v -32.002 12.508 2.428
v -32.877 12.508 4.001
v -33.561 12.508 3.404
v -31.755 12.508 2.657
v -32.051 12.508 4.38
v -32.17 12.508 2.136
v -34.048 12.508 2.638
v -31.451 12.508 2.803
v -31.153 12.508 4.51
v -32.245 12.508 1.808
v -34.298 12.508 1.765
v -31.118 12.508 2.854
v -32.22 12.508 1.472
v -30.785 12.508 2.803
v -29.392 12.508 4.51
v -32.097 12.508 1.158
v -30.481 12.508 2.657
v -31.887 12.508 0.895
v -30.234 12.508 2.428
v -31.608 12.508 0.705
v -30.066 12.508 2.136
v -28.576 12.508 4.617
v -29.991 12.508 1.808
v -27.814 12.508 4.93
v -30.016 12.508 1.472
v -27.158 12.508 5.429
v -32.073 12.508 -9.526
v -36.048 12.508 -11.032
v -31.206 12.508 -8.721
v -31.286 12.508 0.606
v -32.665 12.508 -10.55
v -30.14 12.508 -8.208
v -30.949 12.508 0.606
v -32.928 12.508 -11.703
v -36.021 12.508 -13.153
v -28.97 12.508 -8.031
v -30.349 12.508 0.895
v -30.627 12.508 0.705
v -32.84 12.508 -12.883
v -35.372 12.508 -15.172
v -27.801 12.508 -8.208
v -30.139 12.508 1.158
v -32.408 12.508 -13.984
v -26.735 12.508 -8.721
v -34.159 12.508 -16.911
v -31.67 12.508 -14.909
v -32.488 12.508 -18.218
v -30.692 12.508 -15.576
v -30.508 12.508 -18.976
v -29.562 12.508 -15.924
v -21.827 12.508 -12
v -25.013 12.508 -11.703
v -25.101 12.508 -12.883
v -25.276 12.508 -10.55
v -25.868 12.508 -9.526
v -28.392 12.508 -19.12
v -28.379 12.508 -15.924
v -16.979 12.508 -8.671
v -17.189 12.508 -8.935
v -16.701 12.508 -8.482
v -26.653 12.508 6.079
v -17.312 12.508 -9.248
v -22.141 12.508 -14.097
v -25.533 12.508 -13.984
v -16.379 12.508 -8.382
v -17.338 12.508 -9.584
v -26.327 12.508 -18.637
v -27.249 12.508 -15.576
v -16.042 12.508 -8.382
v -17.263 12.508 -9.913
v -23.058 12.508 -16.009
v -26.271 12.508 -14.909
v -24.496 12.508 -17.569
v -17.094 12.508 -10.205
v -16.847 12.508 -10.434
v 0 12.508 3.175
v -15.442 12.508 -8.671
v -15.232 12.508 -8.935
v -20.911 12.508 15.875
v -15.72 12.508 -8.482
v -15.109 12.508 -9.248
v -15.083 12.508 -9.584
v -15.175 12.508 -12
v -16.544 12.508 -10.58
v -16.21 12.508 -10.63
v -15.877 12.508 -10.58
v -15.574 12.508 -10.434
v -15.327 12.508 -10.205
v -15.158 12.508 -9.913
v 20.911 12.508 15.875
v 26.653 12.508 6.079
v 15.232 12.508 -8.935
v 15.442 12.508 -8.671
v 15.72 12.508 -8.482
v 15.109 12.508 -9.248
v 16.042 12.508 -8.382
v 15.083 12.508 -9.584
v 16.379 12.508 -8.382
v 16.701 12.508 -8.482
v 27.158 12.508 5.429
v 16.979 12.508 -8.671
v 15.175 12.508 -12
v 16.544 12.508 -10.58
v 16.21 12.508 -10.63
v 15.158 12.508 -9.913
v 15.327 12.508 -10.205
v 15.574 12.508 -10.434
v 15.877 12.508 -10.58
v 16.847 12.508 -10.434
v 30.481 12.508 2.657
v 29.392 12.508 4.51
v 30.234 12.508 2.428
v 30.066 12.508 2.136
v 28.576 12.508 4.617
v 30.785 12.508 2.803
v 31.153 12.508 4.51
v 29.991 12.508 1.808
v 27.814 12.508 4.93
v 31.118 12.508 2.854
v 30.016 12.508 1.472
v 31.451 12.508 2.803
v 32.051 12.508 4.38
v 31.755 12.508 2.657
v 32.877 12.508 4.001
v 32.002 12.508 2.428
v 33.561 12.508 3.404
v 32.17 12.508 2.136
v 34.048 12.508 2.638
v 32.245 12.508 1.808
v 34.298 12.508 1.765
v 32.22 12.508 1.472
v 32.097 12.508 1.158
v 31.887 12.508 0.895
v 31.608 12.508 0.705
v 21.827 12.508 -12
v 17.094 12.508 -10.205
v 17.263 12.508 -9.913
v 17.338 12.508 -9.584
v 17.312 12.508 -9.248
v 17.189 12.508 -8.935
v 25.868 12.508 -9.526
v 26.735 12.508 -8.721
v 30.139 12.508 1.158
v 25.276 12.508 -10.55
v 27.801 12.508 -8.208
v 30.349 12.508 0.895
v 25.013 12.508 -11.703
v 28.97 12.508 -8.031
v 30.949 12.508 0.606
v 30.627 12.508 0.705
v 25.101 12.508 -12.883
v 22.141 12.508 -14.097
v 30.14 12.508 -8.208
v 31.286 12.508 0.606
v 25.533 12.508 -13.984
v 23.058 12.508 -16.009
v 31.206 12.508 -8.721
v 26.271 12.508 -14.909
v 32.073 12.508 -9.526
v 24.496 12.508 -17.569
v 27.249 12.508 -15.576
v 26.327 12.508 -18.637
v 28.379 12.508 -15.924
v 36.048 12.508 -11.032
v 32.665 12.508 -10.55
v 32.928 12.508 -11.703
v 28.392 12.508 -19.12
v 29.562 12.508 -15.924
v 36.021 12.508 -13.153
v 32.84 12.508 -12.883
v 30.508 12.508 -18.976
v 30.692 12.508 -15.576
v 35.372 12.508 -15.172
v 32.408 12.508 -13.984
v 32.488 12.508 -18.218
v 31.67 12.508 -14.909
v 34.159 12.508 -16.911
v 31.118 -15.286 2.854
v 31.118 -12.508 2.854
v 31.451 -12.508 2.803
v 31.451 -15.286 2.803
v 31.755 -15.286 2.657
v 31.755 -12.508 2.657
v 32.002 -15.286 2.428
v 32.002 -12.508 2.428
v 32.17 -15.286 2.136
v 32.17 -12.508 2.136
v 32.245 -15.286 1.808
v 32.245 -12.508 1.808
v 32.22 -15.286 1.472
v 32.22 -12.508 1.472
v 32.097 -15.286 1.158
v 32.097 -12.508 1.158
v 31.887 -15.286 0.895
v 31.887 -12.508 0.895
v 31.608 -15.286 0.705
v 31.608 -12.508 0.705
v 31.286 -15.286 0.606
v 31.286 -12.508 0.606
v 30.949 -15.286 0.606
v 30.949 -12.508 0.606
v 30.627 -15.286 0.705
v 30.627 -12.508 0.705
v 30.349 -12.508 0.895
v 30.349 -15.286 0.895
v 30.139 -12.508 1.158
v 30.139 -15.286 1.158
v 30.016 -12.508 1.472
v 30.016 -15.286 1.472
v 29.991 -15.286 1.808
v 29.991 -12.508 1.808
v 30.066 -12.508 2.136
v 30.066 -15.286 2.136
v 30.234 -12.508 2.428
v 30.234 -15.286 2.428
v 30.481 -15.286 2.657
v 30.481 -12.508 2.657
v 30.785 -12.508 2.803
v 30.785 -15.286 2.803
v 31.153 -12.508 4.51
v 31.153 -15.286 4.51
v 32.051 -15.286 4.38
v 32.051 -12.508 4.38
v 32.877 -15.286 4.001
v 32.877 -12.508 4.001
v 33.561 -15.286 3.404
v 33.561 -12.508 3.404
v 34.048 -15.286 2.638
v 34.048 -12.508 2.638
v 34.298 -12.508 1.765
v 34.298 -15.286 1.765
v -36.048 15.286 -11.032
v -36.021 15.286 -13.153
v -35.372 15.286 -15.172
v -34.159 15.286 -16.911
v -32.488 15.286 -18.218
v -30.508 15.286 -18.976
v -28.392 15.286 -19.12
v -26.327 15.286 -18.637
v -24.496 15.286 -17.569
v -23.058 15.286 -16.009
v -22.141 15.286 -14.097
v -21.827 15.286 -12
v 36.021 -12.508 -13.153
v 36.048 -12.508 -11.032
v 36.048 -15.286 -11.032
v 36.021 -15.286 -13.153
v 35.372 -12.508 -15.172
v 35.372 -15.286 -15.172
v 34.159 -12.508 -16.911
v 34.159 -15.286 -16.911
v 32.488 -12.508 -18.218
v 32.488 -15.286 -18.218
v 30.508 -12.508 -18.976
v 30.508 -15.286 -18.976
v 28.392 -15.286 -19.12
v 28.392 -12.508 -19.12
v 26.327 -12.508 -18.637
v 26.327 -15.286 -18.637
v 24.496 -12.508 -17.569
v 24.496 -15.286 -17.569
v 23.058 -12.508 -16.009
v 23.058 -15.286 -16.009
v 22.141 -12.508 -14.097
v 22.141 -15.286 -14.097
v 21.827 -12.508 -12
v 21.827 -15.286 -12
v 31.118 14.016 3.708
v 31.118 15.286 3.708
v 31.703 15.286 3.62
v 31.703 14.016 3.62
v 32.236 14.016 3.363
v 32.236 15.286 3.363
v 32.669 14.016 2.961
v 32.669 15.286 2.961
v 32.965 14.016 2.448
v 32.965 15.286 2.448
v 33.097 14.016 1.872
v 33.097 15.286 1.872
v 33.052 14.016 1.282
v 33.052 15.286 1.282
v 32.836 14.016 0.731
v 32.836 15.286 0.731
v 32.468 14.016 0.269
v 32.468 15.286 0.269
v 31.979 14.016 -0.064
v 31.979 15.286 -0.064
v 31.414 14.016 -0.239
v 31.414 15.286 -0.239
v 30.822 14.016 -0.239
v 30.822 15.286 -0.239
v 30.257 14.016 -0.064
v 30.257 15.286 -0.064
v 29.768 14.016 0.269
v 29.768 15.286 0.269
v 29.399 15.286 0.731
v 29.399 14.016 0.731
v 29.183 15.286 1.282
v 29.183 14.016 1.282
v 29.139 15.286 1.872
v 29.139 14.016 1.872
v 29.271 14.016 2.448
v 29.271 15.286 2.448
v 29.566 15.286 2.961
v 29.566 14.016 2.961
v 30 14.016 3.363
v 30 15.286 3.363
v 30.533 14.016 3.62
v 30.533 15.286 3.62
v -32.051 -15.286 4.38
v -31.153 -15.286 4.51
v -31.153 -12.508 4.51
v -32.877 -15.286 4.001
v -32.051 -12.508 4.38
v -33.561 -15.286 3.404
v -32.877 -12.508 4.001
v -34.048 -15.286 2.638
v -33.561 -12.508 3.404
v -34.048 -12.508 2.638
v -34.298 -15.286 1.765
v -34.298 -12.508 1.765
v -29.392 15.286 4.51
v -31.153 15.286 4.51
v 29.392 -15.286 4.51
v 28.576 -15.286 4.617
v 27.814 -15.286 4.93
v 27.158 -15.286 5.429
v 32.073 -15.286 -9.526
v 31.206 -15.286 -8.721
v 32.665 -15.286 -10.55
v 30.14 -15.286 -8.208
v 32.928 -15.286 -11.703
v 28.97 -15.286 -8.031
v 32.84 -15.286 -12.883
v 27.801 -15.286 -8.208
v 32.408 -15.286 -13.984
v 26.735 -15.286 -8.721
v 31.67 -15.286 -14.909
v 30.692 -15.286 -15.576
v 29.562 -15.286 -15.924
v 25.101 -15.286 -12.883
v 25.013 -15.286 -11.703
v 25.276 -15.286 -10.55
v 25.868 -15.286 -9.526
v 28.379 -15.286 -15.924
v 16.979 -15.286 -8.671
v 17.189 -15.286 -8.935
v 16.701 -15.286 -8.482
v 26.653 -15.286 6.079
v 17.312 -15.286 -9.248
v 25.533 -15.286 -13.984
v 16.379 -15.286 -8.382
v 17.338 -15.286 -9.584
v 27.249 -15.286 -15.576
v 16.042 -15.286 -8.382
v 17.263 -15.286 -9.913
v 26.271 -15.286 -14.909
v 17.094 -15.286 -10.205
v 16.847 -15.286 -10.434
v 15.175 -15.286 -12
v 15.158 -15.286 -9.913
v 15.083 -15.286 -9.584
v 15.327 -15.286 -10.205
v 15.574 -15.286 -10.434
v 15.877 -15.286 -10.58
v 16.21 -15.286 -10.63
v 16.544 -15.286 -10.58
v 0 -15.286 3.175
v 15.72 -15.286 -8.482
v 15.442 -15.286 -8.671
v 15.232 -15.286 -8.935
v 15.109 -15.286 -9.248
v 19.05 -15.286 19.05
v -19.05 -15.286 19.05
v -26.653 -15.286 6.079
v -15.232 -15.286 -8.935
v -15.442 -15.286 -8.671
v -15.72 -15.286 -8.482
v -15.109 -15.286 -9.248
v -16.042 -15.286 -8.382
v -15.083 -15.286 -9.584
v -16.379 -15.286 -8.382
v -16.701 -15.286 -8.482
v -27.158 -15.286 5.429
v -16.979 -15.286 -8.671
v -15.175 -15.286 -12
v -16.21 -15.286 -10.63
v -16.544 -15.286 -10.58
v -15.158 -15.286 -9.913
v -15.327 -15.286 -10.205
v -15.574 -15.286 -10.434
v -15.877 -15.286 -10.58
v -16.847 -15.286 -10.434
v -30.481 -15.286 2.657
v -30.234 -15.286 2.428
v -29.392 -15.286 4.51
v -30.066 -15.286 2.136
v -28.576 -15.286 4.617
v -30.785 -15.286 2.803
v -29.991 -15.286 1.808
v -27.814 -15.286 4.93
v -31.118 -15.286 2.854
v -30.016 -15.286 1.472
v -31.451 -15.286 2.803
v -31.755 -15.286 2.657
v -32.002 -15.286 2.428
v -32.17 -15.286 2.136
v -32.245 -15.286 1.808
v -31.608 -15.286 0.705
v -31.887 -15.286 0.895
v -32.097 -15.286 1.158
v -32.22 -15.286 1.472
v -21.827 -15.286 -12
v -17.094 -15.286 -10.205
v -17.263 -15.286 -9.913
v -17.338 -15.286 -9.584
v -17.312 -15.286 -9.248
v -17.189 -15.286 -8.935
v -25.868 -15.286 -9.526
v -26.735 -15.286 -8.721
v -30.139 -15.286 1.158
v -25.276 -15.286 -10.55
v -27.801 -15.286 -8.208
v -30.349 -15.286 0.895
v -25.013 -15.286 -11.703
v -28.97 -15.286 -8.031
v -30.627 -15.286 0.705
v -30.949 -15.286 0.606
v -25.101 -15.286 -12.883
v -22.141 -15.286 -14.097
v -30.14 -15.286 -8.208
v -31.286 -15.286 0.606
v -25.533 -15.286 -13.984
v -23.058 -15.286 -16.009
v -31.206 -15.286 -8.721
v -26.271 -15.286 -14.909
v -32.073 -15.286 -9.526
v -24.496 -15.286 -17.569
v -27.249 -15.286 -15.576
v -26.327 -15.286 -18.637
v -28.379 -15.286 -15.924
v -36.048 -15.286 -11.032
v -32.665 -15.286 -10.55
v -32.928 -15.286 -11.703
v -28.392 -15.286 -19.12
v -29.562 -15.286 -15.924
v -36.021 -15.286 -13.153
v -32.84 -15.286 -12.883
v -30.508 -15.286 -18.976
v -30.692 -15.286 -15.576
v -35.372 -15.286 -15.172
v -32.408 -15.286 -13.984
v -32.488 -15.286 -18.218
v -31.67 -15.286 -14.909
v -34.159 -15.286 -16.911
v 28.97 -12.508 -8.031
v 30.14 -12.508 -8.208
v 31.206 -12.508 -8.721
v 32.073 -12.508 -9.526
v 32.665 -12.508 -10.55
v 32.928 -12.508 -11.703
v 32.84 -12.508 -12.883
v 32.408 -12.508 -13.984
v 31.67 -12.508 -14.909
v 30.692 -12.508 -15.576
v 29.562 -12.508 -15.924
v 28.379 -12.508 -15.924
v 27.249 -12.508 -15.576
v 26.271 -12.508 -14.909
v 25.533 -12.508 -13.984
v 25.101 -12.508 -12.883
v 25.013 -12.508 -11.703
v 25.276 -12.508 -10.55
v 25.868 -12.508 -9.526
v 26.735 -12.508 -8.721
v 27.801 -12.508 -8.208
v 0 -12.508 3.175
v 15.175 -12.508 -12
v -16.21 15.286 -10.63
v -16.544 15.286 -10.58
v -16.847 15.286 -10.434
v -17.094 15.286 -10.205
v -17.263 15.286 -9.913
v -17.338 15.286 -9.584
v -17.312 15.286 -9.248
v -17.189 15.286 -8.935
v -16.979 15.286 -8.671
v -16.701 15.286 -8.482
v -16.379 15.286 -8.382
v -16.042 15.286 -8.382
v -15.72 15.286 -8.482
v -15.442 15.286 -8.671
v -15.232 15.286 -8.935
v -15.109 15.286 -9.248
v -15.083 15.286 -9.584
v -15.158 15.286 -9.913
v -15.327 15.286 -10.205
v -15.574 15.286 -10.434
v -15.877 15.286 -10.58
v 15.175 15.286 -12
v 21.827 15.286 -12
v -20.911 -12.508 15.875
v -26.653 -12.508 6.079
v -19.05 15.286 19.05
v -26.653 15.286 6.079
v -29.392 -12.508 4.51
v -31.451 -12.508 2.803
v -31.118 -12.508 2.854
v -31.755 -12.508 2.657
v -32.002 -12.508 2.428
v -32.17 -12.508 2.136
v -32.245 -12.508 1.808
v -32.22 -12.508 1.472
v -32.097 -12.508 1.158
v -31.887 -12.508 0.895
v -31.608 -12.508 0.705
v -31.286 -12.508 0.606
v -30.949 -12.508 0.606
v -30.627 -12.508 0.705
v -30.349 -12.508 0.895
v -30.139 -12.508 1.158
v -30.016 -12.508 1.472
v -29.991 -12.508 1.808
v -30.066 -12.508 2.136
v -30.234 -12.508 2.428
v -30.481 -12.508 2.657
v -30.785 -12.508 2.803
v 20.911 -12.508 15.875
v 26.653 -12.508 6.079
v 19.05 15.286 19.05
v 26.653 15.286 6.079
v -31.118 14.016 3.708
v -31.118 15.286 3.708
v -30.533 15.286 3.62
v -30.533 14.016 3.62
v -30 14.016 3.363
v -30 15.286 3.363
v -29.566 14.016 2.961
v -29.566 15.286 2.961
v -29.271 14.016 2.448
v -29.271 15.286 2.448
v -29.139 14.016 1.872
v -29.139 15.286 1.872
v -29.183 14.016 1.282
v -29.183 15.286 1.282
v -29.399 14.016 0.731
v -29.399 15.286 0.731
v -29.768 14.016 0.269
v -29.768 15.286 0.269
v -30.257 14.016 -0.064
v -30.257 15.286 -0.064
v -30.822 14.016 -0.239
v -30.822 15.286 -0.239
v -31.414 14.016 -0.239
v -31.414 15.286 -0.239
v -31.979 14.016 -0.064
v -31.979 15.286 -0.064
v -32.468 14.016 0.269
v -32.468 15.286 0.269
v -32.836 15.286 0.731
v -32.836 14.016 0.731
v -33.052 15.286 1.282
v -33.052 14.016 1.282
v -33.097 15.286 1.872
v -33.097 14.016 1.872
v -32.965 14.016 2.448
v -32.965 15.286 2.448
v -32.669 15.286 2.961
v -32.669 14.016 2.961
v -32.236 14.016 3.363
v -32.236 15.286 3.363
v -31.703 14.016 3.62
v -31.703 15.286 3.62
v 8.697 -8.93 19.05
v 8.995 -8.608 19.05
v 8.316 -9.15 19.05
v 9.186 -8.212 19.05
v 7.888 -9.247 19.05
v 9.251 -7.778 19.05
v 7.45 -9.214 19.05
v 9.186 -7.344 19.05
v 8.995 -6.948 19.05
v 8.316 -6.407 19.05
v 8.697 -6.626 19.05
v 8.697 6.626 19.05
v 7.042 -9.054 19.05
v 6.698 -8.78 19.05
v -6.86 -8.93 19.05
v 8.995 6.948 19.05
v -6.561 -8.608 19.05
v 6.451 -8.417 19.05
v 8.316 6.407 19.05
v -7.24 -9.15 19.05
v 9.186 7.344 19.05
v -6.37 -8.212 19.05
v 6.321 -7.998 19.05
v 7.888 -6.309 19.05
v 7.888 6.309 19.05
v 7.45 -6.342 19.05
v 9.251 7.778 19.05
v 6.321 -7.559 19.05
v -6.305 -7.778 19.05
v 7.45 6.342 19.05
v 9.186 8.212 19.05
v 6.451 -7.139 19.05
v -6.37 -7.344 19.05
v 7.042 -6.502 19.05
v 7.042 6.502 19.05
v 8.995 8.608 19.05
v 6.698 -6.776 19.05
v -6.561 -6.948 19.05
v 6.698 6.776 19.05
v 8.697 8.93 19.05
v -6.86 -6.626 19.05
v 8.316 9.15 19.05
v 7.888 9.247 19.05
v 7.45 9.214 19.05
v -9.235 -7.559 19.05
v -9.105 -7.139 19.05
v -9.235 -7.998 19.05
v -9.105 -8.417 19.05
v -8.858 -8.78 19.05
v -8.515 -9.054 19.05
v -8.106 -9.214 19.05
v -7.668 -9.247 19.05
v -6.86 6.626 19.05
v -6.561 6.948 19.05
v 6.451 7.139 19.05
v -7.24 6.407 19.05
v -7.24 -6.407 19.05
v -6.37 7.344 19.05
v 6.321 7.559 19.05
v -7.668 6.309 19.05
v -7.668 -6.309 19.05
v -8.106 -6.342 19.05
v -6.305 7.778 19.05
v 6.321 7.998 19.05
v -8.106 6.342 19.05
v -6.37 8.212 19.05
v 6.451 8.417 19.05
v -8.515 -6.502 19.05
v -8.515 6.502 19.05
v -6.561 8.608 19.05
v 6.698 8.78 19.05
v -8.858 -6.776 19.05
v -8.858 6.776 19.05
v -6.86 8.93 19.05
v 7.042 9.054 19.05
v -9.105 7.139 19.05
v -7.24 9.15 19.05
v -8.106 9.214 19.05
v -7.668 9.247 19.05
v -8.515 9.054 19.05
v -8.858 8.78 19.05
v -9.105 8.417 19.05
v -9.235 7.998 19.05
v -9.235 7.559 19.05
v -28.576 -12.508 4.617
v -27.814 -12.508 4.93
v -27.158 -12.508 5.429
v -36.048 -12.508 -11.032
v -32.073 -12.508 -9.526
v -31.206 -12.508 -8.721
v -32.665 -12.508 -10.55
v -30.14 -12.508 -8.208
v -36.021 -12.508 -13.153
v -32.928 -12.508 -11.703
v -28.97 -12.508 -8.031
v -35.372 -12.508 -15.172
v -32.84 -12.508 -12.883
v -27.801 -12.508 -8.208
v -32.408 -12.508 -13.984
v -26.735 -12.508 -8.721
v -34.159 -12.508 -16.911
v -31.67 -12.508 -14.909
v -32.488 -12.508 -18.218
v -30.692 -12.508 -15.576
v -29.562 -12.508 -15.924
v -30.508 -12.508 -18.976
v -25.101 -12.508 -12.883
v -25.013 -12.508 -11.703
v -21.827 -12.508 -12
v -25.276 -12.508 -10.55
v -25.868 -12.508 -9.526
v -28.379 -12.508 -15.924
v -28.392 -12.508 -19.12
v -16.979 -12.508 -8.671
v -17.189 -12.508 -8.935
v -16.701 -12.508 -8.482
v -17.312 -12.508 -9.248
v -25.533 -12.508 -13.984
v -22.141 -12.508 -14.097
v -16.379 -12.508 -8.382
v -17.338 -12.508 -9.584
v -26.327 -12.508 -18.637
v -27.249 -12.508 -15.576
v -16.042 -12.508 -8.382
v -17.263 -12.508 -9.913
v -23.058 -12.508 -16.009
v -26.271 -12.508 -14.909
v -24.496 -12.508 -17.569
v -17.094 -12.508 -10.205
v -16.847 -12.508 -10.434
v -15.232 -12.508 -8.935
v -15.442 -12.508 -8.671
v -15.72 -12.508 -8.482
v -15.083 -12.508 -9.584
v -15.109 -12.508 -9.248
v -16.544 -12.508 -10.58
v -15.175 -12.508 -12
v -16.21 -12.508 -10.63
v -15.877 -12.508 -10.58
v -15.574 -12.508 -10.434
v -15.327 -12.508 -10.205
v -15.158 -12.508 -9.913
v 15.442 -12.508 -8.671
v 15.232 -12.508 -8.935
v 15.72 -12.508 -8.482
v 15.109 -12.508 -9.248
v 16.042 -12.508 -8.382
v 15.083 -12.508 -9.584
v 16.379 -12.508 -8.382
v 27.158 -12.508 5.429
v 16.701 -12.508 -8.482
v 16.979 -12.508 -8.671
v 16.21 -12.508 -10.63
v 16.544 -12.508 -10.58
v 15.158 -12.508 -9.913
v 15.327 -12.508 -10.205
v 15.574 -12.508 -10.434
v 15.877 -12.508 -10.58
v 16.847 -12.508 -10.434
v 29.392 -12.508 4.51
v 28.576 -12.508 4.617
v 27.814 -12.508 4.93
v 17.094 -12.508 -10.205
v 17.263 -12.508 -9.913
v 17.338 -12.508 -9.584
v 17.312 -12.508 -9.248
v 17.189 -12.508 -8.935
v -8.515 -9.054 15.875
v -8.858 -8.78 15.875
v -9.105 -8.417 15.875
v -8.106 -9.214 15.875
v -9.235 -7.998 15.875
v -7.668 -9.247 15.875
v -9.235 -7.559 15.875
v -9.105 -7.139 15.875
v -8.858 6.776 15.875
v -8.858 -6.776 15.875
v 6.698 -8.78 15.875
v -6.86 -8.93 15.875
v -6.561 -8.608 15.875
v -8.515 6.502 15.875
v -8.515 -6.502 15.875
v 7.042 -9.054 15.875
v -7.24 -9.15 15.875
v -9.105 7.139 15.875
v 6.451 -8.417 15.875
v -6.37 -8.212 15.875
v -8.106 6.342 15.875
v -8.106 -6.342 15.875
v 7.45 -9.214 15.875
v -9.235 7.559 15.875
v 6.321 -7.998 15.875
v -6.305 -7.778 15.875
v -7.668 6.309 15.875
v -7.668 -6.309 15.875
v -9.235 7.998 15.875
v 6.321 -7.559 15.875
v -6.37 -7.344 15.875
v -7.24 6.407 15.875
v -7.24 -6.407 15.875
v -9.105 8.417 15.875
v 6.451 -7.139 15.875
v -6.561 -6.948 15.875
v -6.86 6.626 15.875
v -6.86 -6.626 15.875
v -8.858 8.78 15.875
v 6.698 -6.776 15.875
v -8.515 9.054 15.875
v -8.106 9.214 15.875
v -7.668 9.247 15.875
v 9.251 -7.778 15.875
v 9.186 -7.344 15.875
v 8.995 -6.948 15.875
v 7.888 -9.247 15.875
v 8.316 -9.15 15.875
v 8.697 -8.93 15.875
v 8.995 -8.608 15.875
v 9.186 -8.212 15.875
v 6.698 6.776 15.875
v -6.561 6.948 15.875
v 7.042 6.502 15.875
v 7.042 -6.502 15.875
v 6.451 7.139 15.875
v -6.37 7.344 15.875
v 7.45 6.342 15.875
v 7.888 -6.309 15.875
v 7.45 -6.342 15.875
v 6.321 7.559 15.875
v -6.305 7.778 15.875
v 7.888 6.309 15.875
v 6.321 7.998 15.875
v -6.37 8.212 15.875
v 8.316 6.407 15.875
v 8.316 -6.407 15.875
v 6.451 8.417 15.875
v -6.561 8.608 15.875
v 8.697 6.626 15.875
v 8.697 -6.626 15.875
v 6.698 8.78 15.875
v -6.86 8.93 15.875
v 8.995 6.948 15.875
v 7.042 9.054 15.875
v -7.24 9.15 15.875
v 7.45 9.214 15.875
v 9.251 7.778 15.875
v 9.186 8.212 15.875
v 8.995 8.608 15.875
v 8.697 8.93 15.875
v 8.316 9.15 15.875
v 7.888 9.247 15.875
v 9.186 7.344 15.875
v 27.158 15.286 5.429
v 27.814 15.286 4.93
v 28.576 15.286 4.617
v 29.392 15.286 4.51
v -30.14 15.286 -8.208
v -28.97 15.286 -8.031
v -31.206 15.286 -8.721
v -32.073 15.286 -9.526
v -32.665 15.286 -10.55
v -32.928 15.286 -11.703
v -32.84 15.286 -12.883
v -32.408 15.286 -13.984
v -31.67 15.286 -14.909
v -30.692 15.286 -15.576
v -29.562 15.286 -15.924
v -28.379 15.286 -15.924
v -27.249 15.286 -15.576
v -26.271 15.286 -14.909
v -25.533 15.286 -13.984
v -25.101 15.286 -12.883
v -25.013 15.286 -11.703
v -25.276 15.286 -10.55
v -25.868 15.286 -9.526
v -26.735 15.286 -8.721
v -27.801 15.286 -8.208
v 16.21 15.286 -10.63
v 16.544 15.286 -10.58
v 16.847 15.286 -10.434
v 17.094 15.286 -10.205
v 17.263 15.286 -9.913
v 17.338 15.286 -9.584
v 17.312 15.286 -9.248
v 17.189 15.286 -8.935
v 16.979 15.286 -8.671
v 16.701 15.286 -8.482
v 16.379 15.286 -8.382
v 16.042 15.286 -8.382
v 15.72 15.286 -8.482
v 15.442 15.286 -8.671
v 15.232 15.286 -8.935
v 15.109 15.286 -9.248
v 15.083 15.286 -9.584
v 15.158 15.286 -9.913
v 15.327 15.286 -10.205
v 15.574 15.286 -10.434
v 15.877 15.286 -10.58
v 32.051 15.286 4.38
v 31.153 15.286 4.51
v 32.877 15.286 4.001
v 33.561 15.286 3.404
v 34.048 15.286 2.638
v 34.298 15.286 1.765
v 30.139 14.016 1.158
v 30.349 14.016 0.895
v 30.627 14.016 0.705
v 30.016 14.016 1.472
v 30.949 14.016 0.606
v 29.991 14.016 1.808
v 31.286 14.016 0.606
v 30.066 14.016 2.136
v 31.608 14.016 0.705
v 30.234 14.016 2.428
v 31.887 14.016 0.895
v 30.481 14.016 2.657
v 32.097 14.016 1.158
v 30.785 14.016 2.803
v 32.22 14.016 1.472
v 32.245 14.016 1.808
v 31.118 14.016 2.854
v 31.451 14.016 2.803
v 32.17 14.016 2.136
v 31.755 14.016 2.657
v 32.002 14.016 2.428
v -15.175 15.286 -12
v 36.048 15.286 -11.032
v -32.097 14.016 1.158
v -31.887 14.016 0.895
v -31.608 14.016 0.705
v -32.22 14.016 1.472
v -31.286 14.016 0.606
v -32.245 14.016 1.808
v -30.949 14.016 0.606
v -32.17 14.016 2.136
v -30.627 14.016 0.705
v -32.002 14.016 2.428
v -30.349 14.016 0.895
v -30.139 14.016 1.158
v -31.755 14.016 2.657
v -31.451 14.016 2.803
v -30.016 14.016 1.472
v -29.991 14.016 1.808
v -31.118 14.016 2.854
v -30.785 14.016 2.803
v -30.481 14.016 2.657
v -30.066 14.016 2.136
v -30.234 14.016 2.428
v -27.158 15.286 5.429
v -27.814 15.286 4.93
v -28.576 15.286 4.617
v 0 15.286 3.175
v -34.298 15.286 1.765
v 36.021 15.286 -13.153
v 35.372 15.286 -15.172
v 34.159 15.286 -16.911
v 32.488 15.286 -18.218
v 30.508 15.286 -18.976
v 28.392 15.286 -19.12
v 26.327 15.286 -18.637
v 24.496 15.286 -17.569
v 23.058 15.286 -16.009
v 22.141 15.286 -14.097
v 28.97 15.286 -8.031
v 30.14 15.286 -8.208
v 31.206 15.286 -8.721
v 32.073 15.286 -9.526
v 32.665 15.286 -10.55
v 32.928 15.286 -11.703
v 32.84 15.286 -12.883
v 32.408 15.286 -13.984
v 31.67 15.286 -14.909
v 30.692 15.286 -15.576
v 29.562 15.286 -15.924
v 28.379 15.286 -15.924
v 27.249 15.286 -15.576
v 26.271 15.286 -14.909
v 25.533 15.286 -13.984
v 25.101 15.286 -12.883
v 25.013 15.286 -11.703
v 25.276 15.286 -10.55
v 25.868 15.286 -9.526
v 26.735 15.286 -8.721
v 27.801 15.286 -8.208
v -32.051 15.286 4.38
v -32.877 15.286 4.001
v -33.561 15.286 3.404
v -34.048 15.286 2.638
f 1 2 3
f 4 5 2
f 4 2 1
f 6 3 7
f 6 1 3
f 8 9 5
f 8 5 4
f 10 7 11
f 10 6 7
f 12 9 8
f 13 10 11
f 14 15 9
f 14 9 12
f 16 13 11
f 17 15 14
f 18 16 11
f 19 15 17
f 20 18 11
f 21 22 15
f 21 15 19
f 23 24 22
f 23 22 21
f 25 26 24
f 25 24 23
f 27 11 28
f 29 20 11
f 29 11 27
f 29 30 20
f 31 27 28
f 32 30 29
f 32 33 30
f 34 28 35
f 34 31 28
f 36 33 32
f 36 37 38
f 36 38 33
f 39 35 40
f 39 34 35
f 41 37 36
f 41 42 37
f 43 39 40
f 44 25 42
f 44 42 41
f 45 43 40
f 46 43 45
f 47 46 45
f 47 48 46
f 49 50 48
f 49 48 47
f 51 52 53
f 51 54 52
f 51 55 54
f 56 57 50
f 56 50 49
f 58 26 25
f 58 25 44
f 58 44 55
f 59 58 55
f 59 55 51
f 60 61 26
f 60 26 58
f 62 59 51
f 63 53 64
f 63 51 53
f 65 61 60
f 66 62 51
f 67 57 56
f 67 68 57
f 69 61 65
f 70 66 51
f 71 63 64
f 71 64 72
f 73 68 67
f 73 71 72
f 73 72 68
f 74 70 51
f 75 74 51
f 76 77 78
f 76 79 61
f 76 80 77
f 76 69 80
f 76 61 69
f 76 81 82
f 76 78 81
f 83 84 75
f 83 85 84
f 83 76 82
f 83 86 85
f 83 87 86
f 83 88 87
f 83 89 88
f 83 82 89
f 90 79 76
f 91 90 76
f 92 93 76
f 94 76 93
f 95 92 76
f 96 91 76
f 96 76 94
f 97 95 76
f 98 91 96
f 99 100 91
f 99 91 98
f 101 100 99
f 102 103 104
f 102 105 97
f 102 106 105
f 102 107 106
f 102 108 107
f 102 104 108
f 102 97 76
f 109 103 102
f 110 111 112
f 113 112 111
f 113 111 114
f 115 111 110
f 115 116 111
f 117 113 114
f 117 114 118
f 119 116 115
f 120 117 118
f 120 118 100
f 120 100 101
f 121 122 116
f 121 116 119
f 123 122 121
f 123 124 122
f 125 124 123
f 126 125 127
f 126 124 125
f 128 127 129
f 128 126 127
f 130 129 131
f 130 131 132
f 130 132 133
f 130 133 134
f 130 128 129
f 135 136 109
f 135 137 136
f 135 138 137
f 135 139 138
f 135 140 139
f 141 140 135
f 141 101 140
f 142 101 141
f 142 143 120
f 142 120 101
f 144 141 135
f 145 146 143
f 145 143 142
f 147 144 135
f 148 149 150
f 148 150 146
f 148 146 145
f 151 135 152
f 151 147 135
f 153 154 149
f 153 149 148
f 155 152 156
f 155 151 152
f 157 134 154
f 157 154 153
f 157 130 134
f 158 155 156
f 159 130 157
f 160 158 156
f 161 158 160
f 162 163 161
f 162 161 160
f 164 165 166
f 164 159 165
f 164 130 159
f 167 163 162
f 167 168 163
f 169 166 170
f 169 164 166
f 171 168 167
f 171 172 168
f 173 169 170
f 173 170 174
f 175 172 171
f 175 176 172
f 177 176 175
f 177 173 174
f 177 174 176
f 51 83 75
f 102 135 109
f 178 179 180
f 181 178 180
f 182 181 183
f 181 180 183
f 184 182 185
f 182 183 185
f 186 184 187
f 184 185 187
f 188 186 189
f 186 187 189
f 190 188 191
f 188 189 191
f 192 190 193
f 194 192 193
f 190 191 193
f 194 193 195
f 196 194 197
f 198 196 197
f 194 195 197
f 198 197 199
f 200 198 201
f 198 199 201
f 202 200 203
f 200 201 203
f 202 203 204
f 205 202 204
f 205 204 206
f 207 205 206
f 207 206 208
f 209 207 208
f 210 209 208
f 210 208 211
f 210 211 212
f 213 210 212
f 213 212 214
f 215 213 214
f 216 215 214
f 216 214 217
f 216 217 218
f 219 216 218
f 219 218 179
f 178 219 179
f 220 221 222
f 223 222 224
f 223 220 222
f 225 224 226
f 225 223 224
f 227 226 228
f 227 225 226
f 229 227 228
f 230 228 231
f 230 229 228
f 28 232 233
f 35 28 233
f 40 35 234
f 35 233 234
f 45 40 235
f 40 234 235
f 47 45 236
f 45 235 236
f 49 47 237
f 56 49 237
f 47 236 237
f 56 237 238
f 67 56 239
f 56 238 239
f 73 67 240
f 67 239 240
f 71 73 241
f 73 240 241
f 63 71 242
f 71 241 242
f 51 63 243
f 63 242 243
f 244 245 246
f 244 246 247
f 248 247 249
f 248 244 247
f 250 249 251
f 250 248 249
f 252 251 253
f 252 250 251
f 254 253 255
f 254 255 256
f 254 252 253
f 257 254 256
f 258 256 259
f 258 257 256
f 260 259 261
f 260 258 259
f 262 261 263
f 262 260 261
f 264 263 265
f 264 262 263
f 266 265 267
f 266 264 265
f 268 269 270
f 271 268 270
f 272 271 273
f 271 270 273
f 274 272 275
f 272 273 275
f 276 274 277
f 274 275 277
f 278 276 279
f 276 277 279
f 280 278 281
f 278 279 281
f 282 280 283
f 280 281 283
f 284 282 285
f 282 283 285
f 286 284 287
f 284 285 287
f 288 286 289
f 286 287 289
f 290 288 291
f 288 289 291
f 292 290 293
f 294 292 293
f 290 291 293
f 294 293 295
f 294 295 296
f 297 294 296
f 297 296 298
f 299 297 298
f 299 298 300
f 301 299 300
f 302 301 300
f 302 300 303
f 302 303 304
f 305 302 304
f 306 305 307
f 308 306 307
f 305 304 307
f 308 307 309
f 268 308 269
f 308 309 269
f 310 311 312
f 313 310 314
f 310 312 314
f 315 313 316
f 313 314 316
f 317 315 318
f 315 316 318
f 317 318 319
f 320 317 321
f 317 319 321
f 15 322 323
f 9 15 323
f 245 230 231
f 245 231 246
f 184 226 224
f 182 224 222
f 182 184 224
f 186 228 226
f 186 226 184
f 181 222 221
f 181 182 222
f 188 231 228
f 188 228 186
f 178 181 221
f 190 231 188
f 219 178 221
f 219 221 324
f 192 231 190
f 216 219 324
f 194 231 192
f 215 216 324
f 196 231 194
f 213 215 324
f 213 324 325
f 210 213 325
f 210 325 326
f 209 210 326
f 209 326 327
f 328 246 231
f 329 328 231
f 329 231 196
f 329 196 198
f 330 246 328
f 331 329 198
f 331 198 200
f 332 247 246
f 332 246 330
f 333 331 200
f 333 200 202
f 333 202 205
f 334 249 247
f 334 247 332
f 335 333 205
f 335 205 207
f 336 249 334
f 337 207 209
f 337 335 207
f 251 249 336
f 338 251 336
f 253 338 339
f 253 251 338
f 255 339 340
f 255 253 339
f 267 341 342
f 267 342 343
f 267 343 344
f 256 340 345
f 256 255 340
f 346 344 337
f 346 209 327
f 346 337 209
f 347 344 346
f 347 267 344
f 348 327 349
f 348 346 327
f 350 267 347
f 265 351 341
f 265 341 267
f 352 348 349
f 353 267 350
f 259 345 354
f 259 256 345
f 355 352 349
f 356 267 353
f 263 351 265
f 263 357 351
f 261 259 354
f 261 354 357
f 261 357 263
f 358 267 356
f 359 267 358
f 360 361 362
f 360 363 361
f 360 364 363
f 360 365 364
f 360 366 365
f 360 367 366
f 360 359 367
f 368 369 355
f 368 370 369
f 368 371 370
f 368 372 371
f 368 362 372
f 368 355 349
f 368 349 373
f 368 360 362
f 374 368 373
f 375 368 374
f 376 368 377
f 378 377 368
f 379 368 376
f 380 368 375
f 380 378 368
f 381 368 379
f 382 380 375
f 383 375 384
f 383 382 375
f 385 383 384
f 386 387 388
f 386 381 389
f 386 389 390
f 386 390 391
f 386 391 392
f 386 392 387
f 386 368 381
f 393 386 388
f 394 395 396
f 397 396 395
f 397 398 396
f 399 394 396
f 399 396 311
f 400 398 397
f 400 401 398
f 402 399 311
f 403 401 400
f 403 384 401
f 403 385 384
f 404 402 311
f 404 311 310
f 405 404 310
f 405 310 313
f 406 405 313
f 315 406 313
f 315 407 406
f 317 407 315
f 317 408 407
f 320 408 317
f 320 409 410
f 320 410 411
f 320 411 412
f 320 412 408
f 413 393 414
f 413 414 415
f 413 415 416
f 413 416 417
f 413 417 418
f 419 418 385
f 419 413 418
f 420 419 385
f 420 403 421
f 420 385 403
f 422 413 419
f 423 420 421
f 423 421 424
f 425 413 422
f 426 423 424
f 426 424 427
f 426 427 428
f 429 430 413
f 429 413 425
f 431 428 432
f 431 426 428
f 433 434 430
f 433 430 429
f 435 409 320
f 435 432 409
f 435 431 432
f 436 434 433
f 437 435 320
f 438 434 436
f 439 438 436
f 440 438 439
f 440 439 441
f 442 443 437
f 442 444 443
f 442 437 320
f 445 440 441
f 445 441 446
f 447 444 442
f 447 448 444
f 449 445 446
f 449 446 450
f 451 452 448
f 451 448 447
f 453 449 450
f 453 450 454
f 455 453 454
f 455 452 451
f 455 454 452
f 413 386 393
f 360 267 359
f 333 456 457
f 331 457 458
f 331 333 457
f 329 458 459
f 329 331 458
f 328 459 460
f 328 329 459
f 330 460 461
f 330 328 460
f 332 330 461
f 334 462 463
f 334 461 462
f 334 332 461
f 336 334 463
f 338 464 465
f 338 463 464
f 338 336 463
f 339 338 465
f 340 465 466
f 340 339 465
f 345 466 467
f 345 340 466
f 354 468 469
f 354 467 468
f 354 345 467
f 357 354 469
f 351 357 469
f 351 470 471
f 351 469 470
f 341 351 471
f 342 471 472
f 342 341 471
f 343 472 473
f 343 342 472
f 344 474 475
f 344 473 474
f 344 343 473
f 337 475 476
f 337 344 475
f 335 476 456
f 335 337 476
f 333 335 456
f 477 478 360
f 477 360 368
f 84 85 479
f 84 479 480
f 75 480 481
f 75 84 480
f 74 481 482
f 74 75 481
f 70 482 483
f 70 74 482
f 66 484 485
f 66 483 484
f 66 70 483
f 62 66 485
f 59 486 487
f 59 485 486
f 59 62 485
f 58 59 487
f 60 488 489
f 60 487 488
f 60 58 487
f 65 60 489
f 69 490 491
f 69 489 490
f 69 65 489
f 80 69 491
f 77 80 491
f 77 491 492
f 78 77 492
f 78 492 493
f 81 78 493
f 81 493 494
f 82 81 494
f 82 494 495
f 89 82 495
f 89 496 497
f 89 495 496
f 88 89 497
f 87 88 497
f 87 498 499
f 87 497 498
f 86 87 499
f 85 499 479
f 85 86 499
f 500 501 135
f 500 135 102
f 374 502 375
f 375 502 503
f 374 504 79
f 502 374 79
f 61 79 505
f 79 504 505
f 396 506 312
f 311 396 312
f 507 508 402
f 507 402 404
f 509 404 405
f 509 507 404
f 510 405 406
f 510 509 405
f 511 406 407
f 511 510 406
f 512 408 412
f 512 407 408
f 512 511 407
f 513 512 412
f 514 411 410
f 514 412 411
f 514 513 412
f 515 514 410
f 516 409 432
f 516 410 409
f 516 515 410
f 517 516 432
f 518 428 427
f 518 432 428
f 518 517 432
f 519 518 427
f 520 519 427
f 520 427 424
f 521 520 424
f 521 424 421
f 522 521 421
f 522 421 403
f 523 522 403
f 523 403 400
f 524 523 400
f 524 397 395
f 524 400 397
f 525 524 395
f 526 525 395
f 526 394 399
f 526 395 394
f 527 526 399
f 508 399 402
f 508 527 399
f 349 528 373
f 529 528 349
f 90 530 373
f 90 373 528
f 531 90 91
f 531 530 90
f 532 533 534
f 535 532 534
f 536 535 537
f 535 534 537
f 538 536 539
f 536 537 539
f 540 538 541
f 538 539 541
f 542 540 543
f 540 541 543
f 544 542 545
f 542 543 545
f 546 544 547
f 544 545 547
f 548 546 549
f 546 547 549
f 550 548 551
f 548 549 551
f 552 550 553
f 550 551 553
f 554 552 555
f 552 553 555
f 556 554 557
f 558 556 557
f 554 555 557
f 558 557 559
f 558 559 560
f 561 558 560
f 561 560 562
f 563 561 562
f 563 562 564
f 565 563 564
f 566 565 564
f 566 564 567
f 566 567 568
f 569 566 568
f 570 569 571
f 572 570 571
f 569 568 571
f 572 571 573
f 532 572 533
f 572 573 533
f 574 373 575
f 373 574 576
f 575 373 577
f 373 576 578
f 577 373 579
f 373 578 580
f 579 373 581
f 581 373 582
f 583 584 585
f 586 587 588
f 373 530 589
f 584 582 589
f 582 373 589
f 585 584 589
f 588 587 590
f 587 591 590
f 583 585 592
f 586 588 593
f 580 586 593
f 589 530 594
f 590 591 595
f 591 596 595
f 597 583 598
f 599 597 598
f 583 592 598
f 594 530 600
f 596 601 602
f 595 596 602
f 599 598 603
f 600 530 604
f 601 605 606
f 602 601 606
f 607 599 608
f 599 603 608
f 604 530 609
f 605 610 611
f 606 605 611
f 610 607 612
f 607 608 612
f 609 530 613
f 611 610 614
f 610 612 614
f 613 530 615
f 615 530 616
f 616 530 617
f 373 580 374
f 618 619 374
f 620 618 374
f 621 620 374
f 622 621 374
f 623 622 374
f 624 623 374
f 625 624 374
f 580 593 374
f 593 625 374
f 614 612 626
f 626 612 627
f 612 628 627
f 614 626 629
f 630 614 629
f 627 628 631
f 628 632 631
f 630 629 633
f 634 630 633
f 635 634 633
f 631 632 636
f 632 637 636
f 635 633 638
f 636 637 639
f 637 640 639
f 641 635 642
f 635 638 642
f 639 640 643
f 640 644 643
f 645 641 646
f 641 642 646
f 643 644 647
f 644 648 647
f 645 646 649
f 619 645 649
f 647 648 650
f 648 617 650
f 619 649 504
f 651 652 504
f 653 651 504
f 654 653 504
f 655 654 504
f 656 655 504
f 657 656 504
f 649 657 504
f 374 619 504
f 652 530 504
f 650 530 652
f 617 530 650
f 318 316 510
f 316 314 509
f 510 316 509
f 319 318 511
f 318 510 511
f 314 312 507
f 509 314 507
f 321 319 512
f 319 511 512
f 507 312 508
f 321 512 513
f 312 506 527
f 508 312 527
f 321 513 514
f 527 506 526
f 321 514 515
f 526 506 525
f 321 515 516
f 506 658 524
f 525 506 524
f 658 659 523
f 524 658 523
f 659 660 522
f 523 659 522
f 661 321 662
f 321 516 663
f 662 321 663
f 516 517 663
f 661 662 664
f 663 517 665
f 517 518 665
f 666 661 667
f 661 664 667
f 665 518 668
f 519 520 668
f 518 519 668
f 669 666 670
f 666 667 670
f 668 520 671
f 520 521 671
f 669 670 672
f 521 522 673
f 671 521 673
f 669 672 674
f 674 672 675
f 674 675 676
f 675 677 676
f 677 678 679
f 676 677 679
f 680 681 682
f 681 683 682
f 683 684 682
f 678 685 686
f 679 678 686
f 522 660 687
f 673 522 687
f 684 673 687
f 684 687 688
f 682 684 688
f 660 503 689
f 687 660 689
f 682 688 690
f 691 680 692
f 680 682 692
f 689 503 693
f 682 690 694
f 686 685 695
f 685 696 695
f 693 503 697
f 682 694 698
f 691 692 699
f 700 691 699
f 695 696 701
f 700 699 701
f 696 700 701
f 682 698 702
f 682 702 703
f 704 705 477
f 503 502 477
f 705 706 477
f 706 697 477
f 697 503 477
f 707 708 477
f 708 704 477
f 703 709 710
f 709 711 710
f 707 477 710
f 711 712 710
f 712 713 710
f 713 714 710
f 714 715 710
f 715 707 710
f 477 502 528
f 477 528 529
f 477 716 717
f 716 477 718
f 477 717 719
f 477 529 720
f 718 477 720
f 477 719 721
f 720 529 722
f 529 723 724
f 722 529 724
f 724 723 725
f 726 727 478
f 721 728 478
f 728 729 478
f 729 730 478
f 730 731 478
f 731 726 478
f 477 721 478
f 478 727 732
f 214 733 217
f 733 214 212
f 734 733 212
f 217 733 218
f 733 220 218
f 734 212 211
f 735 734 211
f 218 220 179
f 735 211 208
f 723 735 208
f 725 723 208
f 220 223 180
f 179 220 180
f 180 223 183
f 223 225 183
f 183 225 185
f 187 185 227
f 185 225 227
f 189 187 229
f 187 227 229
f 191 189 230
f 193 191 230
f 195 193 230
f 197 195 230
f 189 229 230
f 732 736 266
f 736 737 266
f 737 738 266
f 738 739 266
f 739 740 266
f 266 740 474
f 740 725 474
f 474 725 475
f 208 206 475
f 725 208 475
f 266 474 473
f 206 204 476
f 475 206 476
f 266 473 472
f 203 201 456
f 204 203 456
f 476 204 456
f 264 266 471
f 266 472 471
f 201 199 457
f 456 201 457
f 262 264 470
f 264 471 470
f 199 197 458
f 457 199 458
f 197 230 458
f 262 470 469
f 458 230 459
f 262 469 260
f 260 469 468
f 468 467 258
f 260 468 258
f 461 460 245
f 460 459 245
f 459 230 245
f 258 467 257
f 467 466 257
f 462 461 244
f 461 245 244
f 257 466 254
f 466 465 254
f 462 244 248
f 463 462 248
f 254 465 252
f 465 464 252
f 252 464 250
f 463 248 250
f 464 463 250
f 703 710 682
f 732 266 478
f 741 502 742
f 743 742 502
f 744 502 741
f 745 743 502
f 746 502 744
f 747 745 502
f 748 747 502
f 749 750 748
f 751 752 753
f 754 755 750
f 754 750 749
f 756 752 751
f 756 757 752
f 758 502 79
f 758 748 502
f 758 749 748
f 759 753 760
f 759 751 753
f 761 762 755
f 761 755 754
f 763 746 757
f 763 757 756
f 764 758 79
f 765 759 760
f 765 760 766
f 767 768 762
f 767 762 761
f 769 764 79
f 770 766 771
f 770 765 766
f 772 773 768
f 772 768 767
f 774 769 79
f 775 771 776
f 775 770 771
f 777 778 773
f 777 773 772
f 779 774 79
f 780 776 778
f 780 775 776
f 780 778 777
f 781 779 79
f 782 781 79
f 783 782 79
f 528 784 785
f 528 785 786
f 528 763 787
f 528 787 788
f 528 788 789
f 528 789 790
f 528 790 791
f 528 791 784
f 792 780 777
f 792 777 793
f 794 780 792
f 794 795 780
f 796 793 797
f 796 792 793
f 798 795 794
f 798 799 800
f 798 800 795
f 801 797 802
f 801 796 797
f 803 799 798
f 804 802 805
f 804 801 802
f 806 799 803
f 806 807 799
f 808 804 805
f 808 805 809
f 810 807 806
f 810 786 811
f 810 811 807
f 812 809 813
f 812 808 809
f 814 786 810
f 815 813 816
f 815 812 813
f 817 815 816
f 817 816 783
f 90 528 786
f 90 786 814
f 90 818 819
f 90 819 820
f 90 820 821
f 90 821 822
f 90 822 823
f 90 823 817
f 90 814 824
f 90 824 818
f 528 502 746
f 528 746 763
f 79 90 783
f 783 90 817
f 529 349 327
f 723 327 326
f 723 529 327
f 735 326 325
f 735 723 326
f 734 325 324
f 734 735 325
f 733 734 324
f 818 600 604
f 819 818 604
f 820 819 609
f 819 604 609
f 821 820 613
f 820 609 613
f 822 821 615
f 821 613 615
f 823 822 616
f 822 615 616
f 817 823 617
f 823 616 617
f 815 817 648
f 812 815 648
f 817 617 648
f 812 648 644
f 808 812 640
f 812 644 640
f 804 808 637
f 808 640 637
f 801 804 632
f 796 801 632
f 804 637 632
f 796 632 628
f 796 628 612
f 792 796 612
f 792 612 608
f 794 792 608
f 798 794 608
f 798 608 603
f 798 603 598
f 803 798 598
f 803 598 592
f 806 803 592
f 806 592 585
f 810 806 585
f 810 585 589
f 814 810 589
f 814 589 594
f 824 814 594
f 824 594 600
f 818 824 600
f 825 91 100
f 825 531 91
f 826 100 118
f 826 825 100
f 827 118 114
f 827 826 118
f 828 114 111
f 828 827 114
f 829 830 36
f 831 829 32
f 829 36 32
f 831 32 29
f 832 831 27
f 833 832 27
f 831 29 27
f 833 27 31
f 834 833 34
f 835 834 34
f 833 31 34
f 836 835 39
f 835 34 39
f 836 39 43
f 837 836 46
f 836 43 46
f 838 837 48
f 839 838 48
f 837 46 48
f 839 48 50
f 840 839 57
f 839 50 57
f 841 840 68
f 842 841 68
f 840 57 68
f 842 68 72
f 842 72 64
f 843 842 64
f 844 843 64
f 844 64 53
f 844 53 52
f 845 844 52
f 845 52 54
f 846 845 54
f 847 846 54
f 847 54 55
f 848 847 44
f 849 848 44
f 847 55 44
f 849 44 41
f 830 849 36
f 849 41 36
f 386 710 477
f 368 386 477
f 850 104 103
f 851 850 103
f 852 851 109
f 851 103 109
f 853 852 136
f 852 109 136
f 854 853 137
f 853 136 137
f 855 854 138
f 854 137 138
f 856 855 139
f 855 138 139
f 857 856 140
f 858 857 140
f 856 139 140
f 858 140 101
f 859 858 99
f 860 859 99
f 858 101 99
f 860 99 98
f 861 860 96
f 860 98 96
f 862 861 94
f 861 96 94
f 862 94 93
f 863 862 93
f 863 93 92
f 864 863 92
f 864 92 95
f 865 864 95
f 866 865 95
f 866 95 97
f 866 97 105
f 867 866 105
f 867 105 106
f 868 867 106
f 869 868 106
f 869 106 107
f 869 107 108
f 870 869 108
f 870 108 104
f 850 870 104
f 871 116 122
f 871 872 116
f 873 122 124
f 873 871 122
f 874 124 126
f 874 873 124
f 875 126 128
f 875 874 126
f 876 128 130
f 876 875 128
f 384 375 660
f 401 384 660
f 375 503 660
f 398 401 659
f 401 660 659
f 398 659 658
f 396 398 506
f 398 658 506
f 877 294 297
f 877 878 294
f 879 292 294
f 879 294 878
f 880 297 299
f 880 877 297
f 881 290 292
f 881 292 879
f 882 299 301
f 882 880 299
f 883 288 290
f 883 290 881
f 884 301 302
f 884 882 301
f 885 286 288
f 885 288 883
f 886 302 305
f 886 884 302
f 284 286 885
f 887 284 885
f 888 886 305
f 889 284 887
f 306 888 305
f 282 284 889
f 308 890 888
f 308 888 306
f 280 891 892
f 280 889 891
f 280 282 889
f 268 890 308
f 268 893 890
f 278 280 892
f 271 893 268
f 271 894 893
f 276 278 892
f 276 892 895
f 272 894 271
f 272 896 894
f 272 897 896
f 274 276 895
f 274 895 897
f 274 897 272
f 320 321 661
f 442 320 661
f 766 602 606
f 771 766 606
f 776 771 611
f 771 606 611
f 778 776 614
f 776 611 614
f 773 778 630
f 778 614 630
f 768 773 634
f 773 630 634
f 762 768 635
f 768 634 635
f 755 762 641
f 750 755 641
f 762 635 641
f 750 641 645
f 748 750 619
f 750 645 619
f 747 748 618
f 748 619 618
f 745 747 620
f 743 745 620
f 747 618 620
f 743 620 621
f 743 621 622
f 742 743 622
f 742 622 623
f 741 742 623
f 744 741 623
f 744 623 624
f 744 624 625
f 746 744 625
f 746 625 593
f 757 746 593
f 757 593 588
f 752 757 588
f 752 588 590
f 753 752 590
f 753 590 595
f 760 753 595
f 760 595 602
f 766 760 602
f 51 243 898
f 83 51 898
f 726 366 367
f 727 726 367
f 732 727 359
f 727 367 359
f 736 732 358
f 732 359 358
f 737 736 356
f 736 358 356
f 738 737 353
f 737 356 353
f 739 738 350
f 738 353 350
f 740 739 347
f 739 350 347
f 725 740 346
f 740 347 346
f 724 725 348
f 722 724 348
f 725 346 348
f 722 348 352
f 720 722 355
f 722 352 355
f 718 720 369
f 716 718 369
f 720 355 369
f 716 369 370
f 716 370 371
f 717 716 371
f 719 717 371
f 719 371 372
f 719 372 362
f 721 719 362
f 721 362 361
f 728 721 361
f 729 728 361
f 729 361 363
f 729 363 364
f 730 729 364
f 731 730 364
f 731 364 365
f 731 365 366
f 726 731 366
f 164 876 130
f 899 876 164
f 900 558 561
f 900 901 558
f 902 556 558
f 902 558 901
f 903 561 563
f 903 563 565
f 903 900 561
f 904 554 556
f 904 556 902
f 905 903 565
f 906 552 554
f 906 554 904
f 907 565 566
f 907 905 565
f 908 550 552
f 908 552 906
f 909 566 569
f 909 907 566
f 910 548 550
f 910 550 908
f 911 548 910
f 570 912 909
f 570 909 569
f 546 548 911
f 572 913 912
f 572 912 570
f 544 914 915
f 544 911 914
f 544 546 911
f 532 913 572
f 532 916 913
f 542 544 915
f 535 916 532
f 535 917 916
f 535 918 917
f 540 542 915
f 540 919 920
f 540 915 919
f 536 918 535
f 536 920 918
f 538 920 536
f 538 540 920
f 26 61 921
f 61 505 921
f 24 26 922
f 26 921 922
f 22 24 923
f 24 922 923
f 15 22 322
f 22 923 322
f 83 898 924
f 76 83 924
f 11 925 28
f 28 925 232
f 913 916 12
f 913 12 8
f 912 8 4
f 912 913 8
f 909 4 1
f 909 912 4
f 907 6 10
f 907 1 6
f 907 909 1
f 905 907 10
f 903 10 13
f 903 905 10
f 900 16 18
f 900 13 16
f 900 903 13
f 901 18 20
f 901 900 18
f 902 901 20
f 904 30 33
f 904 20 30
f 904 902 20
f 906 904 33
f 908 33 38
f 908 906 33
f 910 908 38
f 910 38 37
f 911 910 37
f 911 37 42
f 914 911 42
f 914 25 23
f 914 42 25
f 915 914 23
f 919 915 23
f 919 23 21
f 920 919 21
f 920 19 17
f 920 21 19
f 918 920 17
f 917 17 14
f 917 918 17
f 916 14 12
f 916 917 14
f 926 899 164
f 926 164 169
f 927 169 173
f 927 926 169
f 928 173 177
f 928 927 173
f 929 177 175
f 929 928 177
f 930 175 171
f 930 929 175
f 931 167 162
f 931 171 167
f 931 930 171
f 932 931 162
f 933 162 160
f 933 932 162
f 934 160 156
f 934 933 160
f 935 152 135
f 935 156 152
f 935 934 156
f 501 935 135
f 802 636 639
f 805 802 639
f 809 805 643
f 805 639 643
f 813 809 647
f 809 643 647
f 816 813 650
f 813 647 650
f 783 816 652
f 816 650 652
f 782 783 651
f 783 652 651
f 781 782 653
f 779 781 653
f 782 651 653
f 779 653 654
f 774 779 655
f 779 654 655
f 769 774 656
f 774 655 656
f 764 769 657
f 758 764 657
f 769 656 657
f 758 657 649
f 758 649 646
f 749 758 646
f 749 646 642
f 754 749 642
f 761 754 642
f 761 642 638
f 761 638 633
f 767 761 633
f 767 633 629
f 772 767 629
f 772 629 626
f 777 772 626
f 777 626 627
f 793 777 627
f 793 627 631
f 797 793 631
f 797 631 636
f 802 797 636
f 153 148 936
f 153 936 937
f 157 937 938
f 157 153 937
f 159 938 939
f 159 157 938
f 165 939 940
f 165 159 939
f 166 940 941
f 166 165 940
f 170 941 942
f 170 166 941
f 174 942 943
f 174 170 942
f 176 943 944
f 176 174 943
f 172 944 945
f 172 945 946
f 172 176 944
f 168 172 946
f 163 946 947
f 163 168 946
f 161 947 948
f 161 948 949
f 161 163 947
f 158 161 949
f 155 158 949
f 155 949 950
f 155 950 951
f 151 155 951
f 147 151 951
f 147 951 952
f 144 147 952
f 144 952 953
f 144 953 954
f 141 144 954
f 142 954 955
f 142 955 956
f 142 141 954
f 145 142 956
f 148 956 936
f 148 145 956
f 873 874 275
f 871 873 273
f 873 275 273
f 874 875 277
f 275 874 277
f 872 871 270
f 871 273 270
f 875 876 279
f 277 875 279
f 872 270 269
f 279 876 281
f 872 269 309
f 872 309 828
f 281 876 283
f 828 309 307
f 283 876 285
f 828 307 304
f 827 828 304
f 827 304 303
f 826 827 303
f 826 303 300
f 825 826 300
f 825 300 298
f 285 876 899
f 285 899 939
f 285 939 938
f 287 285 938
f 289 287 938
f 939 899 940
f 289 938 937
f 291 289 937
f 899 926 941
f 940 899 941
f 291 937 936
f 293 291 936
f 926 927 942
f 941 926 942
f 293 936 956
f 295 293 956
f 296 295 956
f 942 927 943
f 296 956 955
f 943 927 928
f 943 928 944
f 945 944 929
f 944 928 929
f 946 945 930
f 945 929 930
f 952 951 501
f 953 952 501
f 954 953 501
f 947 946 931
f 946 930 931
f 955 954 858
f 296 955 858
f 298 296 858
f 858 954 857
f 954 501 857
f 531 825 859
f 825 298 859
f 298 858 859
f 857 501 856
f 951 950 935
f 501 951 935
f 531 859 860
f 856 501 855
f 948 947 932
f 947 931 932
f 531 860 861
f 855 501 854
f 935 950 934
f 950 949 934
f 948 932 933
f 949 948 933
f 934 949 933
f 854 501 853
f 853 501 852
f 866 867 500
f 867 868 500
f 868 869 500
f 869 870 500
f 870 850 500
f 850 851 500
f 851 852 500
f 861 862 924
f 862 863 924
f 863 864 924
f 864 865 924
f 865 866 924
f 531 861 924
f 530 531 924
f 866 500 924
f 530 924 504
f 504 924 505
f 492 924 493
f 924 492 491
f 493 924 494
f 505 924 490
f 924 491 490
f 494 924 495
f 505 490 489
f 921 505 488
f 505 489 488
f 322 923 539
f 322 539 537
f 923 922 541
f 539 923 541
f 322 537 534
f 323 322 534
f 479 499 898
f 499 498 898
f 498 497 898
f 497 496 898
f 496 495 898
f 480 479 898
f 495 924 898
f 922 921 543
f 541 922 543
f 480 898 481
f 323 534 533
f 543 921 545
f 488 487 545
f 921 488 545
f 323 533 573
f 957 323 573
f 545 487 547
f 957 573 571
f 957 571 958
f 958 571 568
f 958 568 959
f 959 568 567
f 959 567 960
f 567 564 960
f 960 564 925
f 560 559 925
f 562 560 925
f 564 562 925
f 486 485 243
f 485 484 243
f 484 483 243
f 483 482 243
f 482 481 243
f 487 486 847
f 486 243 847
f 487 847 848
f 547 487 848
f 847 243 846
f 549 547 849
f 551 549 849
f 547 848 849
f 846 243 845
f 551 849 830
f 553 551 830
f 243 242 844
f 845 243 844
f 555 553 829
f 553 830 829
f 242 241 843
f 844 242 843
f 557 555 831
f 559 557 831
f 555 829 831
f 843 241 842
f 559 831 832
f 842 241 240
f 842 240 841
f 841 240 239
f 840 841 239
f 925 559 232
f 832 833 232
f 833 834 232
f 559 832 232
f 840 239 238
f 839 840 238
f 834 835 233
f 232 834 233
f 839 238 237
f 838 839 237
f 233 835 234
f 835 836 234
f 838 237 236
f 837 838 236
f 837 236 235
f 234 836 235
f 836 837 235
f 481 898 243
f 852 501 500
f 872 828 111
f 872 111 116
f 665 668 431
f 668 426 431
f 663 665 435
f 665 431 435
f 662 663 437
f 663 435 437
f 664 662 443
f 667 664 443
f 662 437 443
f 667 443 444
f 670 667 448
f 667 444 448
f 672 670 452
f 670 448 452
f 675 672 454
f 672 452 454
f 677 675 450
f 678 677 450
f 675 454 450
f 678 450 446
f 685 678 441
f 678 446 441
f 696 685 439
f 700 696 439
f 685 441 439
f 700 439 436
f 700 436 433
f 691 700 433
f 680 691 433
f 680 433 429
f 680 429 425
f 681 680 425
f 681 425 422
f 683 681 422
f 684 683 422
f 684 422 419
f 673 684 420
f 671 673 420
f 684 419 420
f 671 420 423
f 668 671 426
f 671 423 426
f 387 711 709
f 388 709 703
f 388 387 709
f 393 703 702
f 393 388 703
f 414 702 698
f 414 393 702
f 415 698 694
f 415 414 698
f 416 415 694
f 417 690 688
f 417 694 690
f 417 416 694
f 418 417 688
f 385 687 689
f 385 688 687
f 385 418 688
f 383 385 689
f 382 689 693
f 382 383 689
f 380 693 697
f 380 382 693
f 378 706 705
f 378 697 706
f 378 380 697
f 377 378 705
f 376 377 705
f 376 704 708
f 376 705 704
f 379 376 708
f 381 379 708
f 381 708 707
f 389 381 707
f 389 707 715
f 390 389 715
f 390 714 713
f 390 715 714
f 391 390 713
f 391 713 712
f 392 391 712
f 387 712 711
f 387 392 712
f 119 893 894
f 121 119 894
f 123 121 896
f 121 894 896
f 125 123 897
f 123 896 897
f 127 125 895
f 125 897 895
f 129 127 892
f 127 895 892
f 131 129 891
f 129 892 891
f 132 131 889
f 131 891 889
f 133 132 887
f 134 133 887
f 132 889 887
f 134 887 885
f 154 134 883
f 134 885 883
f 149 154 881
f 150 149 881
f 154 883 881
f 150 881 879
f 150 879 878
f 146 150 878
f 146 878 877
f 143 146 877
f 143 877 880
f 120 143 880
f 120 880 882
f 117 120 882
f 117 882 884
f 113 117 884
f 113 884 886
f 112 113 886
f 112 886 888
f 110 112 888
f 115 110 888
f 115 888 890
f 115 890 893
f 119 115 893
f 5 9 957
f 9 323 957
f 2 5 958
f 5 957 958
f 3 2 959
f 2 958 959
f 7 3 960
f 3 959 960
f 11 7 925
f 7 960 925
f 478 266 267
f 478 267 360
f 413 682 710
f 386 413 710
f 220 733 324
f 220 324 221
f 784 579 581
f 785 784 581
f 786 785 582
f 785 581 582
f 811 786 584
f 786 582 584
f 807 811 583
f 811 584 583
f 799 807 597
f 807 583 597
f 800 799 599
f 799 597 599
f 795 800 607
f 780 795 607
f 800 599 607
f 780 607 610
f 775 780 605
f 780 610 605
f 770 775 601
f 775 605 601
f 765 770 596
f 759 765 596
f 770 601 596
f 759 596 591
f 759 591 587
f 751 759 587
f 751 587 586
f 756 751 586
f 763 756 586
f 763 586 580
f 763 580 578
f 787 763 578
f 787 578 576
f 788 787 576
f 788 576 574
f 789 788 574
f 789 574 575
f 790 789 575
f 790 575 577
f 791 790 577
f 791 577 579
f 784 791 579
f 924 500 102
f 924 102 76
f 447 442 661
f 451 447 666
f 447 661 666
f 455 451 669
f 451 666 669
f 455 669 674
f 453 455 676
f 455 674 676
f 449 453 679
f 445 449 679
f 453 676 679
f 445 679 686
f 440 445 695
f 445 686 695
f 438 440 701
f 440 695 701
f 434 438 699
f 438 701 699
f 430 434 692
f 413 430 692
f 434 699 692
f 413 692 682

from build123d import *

# Parameters (mm, degrees)
SKETCH1_R            = 3.96875
BOSS_EXTRUDE1_DEPTH  = 15.286125003
SKETCH2_W            = 35.01875
SKETCH2_H            = 25.016000006
CUT_EXTRUDE1_DEPTH   = 40.686125003
SKETCH3_R            = 1.1303
CUT_EXTRUDE2_DEPTH   = 52.042953466
FILLET1_R            = 3.175
SKETCH9_R            = 1.1303
CUT_EXTRUDE5_DEPTH   = 52.042953466
FILLET1_OF_MIRROR3_R = 3.175
SKETCH7_R            = 1.4732
CUT_EXTRUDE3_DEPTH   = 55.741808709
SKETCH8_R            = 1.984375
CUT_EXTRUDE4_DEPTH   = 1.27


with BuildPart() as part:
    # Sketch1 → Boss-Extrude1 (new, symmetric)
    with BuildSketch(Plane(origin=(0, 0, 0), x_dir=(1, 0, 0), z_dir=(0, 1, 0))):
        with BuildLine():
            Line((0, -3.175), (0, -19.05))
            Line((0, -19.05), (19.05, -19.05))
            Line((19.05, -19.05), (27.573163108, -4.51))
            Line((27.573163108, -4.51), (33.923163108, -4.51))
            Line((33.923163108, -4.51), (36.048366078, 11.032185755))
            ThreePointArc((36.048366078, 11.032185755), (29.455504341, 19.1272655), (21.826728, 12))
            Line((21.826728, 12), (15.175, 12))
            Line((15.175, 12), (0, -3.175))
        make_face()
        with Locations(Location((28.970478, 12, 0), (0, 0, 270))):
            Circle(SKETCH1_R, mode=Mode.SUBTRACT)
    boss_extrude1 = extrude(amount=BOSS_EXTRUDE1_DEPTH, both=True)

    # Sketch2 → Cut-Extrude1 (cut, symmetric)
    with BuildSketch(Plane(origin=(0, 0, 0), x_dir=(0, 0, -1), z_dir=(1, 0, 0))):
        with Locations((1.634375, 0)):
            Rectangle(SKETCH2_W, SKETCH2_H)
    cut_extrude1 = extrude(amount=CUT_EXTRUDE1_DEPTH, both=True, mode=Mode.SUBTRACT)

    # Sketch3 → Cut-Extrude2 (cut, through all)
    with BuildSketch(Plane(origin=(0, 15.286125003, 0), x_dir=(1, 0, 0), z_dir=(0, 1, 0))):
        with Locations(Location((31.117871418, -1.723399824, 0), (0, 0, 270))):
            Circle(SKETCH3_R)
    cut_extrude2 = extrude(amount=-CUT_EXTRUDE2_DEPTH, mode=Mode.SUBTRACT)

    # Fillet1
    fillet1_edges = [part.edges().sort_by_distance(p)[0] for p in [
        (33.923163108, 13.897062503, 4.51),
        (27.573163108, 13.897062503, 4.51),
        (33.923163108, -13.897062503, 4.51),
        (27.573163108, -13.897062503, 4.51),
    ]]
    fillet(fillet1_edges, radius=FILLET1_R)

    # Sketch9 → Cut-Extrude5 (cut, through all)
    with BuildSketch(Plane.XZ.offset(15.286125003)):
        with Locations(Location((16.210478, -9.5, 0), (0, 0, 270))):
            Circle(SKETCH9_R)
    cut_extrude5 = extrude(amount=-CUT_EXTRUDE5_DEPTH, mode=Mode.SUBTRACT)

    # Mirror3: Boss-Extrude1, Cut-Extrude1, Cut-Extrude2, Cut-Extrude5 across plane
    add(boss_extrude1.mirror(Plane(origin=(0, 15.286125003, 3.175), x_dir=(0, 0, 1), z_dir=(1, 0, 0))))
    add(cut_extrude1.mirror(Plane(origin=(0, 15.286125003, 3.175), x_dir=(0, 0, 1), z_dir=(1, 0, 0))), mode=Mode.SUBTRACT)
    add(cut_extrude2.mirror(Plane(origin=(0, 15.286125003, 3.175), x_dir=(0, 0, 1), z_dir=(1, 0, 0))), mode=Mode.SUBTRACT)
    add(cut_extrude5.mirror(Plane(origin=(0, 15.286125003, 3.175), x_dir=(0, 0, 1), z_dir=(1, 0, 0))), mode=Mode.SUBTRACT)

    # Fillet1 of Mirror3
    fillet1_of_mirror3_edges = [part.edges().sort_by_distance(p)[0] for p in [
        (-33.923163108, 13.897062503, 4.51),
        (-27.573163108, 13.897062503, 4.51),
        (-33.923163108, -13.897062503, 4.51),
        (-27.573163108, -13.897062503, 4.51),
    ]]
    fillet(fillet1_of_mirror3_edges, radius=FILLET1_OF_MIRROR3_R)

    # Sketch7 → Cut-Extrude3 (cut, through all)
    with BuildSketch(Plane.XY.offset(19.05)):
        with Locations((-7.778174593, 7.778174593)):
            Circle(SKETCH7_R)
        with Locations((7.778174593, 7.778174593)):
            Circle(SKETCH7_R)
        with Locations((7.778174593, -7.778174593)):
            Circle(SKETCH7_R)
        with Locations((-7.778174593, -7.778174593)):
            Circle(SKETCH7_R)
    extrude(amount=-CUT_EXTRUDE3_DEPTH, mode=Mode.SUBTRACT)

    # Sketch8 → Cut-Extrude4 (cut)
    with BuildSketch(Plane(origin=(0, 15.286125003, 0), x_dir=(1, 0, 0), z_dir=(0, 1, 0))):
        with Locations(Location((31.117871418, -1.723399824, 0), (0, 0, 270))):
            Circle(SKETCH8_R)
        with Locations(Location((-31.117871418, -1.723399824, 0), (0, 0, 270))):
            Circle(SKETCH8_R)
    extrude(amount=-CUT_EXTRUDE4_DEPTH, mode=Mode.SUBTRACT)


solid = part.part
